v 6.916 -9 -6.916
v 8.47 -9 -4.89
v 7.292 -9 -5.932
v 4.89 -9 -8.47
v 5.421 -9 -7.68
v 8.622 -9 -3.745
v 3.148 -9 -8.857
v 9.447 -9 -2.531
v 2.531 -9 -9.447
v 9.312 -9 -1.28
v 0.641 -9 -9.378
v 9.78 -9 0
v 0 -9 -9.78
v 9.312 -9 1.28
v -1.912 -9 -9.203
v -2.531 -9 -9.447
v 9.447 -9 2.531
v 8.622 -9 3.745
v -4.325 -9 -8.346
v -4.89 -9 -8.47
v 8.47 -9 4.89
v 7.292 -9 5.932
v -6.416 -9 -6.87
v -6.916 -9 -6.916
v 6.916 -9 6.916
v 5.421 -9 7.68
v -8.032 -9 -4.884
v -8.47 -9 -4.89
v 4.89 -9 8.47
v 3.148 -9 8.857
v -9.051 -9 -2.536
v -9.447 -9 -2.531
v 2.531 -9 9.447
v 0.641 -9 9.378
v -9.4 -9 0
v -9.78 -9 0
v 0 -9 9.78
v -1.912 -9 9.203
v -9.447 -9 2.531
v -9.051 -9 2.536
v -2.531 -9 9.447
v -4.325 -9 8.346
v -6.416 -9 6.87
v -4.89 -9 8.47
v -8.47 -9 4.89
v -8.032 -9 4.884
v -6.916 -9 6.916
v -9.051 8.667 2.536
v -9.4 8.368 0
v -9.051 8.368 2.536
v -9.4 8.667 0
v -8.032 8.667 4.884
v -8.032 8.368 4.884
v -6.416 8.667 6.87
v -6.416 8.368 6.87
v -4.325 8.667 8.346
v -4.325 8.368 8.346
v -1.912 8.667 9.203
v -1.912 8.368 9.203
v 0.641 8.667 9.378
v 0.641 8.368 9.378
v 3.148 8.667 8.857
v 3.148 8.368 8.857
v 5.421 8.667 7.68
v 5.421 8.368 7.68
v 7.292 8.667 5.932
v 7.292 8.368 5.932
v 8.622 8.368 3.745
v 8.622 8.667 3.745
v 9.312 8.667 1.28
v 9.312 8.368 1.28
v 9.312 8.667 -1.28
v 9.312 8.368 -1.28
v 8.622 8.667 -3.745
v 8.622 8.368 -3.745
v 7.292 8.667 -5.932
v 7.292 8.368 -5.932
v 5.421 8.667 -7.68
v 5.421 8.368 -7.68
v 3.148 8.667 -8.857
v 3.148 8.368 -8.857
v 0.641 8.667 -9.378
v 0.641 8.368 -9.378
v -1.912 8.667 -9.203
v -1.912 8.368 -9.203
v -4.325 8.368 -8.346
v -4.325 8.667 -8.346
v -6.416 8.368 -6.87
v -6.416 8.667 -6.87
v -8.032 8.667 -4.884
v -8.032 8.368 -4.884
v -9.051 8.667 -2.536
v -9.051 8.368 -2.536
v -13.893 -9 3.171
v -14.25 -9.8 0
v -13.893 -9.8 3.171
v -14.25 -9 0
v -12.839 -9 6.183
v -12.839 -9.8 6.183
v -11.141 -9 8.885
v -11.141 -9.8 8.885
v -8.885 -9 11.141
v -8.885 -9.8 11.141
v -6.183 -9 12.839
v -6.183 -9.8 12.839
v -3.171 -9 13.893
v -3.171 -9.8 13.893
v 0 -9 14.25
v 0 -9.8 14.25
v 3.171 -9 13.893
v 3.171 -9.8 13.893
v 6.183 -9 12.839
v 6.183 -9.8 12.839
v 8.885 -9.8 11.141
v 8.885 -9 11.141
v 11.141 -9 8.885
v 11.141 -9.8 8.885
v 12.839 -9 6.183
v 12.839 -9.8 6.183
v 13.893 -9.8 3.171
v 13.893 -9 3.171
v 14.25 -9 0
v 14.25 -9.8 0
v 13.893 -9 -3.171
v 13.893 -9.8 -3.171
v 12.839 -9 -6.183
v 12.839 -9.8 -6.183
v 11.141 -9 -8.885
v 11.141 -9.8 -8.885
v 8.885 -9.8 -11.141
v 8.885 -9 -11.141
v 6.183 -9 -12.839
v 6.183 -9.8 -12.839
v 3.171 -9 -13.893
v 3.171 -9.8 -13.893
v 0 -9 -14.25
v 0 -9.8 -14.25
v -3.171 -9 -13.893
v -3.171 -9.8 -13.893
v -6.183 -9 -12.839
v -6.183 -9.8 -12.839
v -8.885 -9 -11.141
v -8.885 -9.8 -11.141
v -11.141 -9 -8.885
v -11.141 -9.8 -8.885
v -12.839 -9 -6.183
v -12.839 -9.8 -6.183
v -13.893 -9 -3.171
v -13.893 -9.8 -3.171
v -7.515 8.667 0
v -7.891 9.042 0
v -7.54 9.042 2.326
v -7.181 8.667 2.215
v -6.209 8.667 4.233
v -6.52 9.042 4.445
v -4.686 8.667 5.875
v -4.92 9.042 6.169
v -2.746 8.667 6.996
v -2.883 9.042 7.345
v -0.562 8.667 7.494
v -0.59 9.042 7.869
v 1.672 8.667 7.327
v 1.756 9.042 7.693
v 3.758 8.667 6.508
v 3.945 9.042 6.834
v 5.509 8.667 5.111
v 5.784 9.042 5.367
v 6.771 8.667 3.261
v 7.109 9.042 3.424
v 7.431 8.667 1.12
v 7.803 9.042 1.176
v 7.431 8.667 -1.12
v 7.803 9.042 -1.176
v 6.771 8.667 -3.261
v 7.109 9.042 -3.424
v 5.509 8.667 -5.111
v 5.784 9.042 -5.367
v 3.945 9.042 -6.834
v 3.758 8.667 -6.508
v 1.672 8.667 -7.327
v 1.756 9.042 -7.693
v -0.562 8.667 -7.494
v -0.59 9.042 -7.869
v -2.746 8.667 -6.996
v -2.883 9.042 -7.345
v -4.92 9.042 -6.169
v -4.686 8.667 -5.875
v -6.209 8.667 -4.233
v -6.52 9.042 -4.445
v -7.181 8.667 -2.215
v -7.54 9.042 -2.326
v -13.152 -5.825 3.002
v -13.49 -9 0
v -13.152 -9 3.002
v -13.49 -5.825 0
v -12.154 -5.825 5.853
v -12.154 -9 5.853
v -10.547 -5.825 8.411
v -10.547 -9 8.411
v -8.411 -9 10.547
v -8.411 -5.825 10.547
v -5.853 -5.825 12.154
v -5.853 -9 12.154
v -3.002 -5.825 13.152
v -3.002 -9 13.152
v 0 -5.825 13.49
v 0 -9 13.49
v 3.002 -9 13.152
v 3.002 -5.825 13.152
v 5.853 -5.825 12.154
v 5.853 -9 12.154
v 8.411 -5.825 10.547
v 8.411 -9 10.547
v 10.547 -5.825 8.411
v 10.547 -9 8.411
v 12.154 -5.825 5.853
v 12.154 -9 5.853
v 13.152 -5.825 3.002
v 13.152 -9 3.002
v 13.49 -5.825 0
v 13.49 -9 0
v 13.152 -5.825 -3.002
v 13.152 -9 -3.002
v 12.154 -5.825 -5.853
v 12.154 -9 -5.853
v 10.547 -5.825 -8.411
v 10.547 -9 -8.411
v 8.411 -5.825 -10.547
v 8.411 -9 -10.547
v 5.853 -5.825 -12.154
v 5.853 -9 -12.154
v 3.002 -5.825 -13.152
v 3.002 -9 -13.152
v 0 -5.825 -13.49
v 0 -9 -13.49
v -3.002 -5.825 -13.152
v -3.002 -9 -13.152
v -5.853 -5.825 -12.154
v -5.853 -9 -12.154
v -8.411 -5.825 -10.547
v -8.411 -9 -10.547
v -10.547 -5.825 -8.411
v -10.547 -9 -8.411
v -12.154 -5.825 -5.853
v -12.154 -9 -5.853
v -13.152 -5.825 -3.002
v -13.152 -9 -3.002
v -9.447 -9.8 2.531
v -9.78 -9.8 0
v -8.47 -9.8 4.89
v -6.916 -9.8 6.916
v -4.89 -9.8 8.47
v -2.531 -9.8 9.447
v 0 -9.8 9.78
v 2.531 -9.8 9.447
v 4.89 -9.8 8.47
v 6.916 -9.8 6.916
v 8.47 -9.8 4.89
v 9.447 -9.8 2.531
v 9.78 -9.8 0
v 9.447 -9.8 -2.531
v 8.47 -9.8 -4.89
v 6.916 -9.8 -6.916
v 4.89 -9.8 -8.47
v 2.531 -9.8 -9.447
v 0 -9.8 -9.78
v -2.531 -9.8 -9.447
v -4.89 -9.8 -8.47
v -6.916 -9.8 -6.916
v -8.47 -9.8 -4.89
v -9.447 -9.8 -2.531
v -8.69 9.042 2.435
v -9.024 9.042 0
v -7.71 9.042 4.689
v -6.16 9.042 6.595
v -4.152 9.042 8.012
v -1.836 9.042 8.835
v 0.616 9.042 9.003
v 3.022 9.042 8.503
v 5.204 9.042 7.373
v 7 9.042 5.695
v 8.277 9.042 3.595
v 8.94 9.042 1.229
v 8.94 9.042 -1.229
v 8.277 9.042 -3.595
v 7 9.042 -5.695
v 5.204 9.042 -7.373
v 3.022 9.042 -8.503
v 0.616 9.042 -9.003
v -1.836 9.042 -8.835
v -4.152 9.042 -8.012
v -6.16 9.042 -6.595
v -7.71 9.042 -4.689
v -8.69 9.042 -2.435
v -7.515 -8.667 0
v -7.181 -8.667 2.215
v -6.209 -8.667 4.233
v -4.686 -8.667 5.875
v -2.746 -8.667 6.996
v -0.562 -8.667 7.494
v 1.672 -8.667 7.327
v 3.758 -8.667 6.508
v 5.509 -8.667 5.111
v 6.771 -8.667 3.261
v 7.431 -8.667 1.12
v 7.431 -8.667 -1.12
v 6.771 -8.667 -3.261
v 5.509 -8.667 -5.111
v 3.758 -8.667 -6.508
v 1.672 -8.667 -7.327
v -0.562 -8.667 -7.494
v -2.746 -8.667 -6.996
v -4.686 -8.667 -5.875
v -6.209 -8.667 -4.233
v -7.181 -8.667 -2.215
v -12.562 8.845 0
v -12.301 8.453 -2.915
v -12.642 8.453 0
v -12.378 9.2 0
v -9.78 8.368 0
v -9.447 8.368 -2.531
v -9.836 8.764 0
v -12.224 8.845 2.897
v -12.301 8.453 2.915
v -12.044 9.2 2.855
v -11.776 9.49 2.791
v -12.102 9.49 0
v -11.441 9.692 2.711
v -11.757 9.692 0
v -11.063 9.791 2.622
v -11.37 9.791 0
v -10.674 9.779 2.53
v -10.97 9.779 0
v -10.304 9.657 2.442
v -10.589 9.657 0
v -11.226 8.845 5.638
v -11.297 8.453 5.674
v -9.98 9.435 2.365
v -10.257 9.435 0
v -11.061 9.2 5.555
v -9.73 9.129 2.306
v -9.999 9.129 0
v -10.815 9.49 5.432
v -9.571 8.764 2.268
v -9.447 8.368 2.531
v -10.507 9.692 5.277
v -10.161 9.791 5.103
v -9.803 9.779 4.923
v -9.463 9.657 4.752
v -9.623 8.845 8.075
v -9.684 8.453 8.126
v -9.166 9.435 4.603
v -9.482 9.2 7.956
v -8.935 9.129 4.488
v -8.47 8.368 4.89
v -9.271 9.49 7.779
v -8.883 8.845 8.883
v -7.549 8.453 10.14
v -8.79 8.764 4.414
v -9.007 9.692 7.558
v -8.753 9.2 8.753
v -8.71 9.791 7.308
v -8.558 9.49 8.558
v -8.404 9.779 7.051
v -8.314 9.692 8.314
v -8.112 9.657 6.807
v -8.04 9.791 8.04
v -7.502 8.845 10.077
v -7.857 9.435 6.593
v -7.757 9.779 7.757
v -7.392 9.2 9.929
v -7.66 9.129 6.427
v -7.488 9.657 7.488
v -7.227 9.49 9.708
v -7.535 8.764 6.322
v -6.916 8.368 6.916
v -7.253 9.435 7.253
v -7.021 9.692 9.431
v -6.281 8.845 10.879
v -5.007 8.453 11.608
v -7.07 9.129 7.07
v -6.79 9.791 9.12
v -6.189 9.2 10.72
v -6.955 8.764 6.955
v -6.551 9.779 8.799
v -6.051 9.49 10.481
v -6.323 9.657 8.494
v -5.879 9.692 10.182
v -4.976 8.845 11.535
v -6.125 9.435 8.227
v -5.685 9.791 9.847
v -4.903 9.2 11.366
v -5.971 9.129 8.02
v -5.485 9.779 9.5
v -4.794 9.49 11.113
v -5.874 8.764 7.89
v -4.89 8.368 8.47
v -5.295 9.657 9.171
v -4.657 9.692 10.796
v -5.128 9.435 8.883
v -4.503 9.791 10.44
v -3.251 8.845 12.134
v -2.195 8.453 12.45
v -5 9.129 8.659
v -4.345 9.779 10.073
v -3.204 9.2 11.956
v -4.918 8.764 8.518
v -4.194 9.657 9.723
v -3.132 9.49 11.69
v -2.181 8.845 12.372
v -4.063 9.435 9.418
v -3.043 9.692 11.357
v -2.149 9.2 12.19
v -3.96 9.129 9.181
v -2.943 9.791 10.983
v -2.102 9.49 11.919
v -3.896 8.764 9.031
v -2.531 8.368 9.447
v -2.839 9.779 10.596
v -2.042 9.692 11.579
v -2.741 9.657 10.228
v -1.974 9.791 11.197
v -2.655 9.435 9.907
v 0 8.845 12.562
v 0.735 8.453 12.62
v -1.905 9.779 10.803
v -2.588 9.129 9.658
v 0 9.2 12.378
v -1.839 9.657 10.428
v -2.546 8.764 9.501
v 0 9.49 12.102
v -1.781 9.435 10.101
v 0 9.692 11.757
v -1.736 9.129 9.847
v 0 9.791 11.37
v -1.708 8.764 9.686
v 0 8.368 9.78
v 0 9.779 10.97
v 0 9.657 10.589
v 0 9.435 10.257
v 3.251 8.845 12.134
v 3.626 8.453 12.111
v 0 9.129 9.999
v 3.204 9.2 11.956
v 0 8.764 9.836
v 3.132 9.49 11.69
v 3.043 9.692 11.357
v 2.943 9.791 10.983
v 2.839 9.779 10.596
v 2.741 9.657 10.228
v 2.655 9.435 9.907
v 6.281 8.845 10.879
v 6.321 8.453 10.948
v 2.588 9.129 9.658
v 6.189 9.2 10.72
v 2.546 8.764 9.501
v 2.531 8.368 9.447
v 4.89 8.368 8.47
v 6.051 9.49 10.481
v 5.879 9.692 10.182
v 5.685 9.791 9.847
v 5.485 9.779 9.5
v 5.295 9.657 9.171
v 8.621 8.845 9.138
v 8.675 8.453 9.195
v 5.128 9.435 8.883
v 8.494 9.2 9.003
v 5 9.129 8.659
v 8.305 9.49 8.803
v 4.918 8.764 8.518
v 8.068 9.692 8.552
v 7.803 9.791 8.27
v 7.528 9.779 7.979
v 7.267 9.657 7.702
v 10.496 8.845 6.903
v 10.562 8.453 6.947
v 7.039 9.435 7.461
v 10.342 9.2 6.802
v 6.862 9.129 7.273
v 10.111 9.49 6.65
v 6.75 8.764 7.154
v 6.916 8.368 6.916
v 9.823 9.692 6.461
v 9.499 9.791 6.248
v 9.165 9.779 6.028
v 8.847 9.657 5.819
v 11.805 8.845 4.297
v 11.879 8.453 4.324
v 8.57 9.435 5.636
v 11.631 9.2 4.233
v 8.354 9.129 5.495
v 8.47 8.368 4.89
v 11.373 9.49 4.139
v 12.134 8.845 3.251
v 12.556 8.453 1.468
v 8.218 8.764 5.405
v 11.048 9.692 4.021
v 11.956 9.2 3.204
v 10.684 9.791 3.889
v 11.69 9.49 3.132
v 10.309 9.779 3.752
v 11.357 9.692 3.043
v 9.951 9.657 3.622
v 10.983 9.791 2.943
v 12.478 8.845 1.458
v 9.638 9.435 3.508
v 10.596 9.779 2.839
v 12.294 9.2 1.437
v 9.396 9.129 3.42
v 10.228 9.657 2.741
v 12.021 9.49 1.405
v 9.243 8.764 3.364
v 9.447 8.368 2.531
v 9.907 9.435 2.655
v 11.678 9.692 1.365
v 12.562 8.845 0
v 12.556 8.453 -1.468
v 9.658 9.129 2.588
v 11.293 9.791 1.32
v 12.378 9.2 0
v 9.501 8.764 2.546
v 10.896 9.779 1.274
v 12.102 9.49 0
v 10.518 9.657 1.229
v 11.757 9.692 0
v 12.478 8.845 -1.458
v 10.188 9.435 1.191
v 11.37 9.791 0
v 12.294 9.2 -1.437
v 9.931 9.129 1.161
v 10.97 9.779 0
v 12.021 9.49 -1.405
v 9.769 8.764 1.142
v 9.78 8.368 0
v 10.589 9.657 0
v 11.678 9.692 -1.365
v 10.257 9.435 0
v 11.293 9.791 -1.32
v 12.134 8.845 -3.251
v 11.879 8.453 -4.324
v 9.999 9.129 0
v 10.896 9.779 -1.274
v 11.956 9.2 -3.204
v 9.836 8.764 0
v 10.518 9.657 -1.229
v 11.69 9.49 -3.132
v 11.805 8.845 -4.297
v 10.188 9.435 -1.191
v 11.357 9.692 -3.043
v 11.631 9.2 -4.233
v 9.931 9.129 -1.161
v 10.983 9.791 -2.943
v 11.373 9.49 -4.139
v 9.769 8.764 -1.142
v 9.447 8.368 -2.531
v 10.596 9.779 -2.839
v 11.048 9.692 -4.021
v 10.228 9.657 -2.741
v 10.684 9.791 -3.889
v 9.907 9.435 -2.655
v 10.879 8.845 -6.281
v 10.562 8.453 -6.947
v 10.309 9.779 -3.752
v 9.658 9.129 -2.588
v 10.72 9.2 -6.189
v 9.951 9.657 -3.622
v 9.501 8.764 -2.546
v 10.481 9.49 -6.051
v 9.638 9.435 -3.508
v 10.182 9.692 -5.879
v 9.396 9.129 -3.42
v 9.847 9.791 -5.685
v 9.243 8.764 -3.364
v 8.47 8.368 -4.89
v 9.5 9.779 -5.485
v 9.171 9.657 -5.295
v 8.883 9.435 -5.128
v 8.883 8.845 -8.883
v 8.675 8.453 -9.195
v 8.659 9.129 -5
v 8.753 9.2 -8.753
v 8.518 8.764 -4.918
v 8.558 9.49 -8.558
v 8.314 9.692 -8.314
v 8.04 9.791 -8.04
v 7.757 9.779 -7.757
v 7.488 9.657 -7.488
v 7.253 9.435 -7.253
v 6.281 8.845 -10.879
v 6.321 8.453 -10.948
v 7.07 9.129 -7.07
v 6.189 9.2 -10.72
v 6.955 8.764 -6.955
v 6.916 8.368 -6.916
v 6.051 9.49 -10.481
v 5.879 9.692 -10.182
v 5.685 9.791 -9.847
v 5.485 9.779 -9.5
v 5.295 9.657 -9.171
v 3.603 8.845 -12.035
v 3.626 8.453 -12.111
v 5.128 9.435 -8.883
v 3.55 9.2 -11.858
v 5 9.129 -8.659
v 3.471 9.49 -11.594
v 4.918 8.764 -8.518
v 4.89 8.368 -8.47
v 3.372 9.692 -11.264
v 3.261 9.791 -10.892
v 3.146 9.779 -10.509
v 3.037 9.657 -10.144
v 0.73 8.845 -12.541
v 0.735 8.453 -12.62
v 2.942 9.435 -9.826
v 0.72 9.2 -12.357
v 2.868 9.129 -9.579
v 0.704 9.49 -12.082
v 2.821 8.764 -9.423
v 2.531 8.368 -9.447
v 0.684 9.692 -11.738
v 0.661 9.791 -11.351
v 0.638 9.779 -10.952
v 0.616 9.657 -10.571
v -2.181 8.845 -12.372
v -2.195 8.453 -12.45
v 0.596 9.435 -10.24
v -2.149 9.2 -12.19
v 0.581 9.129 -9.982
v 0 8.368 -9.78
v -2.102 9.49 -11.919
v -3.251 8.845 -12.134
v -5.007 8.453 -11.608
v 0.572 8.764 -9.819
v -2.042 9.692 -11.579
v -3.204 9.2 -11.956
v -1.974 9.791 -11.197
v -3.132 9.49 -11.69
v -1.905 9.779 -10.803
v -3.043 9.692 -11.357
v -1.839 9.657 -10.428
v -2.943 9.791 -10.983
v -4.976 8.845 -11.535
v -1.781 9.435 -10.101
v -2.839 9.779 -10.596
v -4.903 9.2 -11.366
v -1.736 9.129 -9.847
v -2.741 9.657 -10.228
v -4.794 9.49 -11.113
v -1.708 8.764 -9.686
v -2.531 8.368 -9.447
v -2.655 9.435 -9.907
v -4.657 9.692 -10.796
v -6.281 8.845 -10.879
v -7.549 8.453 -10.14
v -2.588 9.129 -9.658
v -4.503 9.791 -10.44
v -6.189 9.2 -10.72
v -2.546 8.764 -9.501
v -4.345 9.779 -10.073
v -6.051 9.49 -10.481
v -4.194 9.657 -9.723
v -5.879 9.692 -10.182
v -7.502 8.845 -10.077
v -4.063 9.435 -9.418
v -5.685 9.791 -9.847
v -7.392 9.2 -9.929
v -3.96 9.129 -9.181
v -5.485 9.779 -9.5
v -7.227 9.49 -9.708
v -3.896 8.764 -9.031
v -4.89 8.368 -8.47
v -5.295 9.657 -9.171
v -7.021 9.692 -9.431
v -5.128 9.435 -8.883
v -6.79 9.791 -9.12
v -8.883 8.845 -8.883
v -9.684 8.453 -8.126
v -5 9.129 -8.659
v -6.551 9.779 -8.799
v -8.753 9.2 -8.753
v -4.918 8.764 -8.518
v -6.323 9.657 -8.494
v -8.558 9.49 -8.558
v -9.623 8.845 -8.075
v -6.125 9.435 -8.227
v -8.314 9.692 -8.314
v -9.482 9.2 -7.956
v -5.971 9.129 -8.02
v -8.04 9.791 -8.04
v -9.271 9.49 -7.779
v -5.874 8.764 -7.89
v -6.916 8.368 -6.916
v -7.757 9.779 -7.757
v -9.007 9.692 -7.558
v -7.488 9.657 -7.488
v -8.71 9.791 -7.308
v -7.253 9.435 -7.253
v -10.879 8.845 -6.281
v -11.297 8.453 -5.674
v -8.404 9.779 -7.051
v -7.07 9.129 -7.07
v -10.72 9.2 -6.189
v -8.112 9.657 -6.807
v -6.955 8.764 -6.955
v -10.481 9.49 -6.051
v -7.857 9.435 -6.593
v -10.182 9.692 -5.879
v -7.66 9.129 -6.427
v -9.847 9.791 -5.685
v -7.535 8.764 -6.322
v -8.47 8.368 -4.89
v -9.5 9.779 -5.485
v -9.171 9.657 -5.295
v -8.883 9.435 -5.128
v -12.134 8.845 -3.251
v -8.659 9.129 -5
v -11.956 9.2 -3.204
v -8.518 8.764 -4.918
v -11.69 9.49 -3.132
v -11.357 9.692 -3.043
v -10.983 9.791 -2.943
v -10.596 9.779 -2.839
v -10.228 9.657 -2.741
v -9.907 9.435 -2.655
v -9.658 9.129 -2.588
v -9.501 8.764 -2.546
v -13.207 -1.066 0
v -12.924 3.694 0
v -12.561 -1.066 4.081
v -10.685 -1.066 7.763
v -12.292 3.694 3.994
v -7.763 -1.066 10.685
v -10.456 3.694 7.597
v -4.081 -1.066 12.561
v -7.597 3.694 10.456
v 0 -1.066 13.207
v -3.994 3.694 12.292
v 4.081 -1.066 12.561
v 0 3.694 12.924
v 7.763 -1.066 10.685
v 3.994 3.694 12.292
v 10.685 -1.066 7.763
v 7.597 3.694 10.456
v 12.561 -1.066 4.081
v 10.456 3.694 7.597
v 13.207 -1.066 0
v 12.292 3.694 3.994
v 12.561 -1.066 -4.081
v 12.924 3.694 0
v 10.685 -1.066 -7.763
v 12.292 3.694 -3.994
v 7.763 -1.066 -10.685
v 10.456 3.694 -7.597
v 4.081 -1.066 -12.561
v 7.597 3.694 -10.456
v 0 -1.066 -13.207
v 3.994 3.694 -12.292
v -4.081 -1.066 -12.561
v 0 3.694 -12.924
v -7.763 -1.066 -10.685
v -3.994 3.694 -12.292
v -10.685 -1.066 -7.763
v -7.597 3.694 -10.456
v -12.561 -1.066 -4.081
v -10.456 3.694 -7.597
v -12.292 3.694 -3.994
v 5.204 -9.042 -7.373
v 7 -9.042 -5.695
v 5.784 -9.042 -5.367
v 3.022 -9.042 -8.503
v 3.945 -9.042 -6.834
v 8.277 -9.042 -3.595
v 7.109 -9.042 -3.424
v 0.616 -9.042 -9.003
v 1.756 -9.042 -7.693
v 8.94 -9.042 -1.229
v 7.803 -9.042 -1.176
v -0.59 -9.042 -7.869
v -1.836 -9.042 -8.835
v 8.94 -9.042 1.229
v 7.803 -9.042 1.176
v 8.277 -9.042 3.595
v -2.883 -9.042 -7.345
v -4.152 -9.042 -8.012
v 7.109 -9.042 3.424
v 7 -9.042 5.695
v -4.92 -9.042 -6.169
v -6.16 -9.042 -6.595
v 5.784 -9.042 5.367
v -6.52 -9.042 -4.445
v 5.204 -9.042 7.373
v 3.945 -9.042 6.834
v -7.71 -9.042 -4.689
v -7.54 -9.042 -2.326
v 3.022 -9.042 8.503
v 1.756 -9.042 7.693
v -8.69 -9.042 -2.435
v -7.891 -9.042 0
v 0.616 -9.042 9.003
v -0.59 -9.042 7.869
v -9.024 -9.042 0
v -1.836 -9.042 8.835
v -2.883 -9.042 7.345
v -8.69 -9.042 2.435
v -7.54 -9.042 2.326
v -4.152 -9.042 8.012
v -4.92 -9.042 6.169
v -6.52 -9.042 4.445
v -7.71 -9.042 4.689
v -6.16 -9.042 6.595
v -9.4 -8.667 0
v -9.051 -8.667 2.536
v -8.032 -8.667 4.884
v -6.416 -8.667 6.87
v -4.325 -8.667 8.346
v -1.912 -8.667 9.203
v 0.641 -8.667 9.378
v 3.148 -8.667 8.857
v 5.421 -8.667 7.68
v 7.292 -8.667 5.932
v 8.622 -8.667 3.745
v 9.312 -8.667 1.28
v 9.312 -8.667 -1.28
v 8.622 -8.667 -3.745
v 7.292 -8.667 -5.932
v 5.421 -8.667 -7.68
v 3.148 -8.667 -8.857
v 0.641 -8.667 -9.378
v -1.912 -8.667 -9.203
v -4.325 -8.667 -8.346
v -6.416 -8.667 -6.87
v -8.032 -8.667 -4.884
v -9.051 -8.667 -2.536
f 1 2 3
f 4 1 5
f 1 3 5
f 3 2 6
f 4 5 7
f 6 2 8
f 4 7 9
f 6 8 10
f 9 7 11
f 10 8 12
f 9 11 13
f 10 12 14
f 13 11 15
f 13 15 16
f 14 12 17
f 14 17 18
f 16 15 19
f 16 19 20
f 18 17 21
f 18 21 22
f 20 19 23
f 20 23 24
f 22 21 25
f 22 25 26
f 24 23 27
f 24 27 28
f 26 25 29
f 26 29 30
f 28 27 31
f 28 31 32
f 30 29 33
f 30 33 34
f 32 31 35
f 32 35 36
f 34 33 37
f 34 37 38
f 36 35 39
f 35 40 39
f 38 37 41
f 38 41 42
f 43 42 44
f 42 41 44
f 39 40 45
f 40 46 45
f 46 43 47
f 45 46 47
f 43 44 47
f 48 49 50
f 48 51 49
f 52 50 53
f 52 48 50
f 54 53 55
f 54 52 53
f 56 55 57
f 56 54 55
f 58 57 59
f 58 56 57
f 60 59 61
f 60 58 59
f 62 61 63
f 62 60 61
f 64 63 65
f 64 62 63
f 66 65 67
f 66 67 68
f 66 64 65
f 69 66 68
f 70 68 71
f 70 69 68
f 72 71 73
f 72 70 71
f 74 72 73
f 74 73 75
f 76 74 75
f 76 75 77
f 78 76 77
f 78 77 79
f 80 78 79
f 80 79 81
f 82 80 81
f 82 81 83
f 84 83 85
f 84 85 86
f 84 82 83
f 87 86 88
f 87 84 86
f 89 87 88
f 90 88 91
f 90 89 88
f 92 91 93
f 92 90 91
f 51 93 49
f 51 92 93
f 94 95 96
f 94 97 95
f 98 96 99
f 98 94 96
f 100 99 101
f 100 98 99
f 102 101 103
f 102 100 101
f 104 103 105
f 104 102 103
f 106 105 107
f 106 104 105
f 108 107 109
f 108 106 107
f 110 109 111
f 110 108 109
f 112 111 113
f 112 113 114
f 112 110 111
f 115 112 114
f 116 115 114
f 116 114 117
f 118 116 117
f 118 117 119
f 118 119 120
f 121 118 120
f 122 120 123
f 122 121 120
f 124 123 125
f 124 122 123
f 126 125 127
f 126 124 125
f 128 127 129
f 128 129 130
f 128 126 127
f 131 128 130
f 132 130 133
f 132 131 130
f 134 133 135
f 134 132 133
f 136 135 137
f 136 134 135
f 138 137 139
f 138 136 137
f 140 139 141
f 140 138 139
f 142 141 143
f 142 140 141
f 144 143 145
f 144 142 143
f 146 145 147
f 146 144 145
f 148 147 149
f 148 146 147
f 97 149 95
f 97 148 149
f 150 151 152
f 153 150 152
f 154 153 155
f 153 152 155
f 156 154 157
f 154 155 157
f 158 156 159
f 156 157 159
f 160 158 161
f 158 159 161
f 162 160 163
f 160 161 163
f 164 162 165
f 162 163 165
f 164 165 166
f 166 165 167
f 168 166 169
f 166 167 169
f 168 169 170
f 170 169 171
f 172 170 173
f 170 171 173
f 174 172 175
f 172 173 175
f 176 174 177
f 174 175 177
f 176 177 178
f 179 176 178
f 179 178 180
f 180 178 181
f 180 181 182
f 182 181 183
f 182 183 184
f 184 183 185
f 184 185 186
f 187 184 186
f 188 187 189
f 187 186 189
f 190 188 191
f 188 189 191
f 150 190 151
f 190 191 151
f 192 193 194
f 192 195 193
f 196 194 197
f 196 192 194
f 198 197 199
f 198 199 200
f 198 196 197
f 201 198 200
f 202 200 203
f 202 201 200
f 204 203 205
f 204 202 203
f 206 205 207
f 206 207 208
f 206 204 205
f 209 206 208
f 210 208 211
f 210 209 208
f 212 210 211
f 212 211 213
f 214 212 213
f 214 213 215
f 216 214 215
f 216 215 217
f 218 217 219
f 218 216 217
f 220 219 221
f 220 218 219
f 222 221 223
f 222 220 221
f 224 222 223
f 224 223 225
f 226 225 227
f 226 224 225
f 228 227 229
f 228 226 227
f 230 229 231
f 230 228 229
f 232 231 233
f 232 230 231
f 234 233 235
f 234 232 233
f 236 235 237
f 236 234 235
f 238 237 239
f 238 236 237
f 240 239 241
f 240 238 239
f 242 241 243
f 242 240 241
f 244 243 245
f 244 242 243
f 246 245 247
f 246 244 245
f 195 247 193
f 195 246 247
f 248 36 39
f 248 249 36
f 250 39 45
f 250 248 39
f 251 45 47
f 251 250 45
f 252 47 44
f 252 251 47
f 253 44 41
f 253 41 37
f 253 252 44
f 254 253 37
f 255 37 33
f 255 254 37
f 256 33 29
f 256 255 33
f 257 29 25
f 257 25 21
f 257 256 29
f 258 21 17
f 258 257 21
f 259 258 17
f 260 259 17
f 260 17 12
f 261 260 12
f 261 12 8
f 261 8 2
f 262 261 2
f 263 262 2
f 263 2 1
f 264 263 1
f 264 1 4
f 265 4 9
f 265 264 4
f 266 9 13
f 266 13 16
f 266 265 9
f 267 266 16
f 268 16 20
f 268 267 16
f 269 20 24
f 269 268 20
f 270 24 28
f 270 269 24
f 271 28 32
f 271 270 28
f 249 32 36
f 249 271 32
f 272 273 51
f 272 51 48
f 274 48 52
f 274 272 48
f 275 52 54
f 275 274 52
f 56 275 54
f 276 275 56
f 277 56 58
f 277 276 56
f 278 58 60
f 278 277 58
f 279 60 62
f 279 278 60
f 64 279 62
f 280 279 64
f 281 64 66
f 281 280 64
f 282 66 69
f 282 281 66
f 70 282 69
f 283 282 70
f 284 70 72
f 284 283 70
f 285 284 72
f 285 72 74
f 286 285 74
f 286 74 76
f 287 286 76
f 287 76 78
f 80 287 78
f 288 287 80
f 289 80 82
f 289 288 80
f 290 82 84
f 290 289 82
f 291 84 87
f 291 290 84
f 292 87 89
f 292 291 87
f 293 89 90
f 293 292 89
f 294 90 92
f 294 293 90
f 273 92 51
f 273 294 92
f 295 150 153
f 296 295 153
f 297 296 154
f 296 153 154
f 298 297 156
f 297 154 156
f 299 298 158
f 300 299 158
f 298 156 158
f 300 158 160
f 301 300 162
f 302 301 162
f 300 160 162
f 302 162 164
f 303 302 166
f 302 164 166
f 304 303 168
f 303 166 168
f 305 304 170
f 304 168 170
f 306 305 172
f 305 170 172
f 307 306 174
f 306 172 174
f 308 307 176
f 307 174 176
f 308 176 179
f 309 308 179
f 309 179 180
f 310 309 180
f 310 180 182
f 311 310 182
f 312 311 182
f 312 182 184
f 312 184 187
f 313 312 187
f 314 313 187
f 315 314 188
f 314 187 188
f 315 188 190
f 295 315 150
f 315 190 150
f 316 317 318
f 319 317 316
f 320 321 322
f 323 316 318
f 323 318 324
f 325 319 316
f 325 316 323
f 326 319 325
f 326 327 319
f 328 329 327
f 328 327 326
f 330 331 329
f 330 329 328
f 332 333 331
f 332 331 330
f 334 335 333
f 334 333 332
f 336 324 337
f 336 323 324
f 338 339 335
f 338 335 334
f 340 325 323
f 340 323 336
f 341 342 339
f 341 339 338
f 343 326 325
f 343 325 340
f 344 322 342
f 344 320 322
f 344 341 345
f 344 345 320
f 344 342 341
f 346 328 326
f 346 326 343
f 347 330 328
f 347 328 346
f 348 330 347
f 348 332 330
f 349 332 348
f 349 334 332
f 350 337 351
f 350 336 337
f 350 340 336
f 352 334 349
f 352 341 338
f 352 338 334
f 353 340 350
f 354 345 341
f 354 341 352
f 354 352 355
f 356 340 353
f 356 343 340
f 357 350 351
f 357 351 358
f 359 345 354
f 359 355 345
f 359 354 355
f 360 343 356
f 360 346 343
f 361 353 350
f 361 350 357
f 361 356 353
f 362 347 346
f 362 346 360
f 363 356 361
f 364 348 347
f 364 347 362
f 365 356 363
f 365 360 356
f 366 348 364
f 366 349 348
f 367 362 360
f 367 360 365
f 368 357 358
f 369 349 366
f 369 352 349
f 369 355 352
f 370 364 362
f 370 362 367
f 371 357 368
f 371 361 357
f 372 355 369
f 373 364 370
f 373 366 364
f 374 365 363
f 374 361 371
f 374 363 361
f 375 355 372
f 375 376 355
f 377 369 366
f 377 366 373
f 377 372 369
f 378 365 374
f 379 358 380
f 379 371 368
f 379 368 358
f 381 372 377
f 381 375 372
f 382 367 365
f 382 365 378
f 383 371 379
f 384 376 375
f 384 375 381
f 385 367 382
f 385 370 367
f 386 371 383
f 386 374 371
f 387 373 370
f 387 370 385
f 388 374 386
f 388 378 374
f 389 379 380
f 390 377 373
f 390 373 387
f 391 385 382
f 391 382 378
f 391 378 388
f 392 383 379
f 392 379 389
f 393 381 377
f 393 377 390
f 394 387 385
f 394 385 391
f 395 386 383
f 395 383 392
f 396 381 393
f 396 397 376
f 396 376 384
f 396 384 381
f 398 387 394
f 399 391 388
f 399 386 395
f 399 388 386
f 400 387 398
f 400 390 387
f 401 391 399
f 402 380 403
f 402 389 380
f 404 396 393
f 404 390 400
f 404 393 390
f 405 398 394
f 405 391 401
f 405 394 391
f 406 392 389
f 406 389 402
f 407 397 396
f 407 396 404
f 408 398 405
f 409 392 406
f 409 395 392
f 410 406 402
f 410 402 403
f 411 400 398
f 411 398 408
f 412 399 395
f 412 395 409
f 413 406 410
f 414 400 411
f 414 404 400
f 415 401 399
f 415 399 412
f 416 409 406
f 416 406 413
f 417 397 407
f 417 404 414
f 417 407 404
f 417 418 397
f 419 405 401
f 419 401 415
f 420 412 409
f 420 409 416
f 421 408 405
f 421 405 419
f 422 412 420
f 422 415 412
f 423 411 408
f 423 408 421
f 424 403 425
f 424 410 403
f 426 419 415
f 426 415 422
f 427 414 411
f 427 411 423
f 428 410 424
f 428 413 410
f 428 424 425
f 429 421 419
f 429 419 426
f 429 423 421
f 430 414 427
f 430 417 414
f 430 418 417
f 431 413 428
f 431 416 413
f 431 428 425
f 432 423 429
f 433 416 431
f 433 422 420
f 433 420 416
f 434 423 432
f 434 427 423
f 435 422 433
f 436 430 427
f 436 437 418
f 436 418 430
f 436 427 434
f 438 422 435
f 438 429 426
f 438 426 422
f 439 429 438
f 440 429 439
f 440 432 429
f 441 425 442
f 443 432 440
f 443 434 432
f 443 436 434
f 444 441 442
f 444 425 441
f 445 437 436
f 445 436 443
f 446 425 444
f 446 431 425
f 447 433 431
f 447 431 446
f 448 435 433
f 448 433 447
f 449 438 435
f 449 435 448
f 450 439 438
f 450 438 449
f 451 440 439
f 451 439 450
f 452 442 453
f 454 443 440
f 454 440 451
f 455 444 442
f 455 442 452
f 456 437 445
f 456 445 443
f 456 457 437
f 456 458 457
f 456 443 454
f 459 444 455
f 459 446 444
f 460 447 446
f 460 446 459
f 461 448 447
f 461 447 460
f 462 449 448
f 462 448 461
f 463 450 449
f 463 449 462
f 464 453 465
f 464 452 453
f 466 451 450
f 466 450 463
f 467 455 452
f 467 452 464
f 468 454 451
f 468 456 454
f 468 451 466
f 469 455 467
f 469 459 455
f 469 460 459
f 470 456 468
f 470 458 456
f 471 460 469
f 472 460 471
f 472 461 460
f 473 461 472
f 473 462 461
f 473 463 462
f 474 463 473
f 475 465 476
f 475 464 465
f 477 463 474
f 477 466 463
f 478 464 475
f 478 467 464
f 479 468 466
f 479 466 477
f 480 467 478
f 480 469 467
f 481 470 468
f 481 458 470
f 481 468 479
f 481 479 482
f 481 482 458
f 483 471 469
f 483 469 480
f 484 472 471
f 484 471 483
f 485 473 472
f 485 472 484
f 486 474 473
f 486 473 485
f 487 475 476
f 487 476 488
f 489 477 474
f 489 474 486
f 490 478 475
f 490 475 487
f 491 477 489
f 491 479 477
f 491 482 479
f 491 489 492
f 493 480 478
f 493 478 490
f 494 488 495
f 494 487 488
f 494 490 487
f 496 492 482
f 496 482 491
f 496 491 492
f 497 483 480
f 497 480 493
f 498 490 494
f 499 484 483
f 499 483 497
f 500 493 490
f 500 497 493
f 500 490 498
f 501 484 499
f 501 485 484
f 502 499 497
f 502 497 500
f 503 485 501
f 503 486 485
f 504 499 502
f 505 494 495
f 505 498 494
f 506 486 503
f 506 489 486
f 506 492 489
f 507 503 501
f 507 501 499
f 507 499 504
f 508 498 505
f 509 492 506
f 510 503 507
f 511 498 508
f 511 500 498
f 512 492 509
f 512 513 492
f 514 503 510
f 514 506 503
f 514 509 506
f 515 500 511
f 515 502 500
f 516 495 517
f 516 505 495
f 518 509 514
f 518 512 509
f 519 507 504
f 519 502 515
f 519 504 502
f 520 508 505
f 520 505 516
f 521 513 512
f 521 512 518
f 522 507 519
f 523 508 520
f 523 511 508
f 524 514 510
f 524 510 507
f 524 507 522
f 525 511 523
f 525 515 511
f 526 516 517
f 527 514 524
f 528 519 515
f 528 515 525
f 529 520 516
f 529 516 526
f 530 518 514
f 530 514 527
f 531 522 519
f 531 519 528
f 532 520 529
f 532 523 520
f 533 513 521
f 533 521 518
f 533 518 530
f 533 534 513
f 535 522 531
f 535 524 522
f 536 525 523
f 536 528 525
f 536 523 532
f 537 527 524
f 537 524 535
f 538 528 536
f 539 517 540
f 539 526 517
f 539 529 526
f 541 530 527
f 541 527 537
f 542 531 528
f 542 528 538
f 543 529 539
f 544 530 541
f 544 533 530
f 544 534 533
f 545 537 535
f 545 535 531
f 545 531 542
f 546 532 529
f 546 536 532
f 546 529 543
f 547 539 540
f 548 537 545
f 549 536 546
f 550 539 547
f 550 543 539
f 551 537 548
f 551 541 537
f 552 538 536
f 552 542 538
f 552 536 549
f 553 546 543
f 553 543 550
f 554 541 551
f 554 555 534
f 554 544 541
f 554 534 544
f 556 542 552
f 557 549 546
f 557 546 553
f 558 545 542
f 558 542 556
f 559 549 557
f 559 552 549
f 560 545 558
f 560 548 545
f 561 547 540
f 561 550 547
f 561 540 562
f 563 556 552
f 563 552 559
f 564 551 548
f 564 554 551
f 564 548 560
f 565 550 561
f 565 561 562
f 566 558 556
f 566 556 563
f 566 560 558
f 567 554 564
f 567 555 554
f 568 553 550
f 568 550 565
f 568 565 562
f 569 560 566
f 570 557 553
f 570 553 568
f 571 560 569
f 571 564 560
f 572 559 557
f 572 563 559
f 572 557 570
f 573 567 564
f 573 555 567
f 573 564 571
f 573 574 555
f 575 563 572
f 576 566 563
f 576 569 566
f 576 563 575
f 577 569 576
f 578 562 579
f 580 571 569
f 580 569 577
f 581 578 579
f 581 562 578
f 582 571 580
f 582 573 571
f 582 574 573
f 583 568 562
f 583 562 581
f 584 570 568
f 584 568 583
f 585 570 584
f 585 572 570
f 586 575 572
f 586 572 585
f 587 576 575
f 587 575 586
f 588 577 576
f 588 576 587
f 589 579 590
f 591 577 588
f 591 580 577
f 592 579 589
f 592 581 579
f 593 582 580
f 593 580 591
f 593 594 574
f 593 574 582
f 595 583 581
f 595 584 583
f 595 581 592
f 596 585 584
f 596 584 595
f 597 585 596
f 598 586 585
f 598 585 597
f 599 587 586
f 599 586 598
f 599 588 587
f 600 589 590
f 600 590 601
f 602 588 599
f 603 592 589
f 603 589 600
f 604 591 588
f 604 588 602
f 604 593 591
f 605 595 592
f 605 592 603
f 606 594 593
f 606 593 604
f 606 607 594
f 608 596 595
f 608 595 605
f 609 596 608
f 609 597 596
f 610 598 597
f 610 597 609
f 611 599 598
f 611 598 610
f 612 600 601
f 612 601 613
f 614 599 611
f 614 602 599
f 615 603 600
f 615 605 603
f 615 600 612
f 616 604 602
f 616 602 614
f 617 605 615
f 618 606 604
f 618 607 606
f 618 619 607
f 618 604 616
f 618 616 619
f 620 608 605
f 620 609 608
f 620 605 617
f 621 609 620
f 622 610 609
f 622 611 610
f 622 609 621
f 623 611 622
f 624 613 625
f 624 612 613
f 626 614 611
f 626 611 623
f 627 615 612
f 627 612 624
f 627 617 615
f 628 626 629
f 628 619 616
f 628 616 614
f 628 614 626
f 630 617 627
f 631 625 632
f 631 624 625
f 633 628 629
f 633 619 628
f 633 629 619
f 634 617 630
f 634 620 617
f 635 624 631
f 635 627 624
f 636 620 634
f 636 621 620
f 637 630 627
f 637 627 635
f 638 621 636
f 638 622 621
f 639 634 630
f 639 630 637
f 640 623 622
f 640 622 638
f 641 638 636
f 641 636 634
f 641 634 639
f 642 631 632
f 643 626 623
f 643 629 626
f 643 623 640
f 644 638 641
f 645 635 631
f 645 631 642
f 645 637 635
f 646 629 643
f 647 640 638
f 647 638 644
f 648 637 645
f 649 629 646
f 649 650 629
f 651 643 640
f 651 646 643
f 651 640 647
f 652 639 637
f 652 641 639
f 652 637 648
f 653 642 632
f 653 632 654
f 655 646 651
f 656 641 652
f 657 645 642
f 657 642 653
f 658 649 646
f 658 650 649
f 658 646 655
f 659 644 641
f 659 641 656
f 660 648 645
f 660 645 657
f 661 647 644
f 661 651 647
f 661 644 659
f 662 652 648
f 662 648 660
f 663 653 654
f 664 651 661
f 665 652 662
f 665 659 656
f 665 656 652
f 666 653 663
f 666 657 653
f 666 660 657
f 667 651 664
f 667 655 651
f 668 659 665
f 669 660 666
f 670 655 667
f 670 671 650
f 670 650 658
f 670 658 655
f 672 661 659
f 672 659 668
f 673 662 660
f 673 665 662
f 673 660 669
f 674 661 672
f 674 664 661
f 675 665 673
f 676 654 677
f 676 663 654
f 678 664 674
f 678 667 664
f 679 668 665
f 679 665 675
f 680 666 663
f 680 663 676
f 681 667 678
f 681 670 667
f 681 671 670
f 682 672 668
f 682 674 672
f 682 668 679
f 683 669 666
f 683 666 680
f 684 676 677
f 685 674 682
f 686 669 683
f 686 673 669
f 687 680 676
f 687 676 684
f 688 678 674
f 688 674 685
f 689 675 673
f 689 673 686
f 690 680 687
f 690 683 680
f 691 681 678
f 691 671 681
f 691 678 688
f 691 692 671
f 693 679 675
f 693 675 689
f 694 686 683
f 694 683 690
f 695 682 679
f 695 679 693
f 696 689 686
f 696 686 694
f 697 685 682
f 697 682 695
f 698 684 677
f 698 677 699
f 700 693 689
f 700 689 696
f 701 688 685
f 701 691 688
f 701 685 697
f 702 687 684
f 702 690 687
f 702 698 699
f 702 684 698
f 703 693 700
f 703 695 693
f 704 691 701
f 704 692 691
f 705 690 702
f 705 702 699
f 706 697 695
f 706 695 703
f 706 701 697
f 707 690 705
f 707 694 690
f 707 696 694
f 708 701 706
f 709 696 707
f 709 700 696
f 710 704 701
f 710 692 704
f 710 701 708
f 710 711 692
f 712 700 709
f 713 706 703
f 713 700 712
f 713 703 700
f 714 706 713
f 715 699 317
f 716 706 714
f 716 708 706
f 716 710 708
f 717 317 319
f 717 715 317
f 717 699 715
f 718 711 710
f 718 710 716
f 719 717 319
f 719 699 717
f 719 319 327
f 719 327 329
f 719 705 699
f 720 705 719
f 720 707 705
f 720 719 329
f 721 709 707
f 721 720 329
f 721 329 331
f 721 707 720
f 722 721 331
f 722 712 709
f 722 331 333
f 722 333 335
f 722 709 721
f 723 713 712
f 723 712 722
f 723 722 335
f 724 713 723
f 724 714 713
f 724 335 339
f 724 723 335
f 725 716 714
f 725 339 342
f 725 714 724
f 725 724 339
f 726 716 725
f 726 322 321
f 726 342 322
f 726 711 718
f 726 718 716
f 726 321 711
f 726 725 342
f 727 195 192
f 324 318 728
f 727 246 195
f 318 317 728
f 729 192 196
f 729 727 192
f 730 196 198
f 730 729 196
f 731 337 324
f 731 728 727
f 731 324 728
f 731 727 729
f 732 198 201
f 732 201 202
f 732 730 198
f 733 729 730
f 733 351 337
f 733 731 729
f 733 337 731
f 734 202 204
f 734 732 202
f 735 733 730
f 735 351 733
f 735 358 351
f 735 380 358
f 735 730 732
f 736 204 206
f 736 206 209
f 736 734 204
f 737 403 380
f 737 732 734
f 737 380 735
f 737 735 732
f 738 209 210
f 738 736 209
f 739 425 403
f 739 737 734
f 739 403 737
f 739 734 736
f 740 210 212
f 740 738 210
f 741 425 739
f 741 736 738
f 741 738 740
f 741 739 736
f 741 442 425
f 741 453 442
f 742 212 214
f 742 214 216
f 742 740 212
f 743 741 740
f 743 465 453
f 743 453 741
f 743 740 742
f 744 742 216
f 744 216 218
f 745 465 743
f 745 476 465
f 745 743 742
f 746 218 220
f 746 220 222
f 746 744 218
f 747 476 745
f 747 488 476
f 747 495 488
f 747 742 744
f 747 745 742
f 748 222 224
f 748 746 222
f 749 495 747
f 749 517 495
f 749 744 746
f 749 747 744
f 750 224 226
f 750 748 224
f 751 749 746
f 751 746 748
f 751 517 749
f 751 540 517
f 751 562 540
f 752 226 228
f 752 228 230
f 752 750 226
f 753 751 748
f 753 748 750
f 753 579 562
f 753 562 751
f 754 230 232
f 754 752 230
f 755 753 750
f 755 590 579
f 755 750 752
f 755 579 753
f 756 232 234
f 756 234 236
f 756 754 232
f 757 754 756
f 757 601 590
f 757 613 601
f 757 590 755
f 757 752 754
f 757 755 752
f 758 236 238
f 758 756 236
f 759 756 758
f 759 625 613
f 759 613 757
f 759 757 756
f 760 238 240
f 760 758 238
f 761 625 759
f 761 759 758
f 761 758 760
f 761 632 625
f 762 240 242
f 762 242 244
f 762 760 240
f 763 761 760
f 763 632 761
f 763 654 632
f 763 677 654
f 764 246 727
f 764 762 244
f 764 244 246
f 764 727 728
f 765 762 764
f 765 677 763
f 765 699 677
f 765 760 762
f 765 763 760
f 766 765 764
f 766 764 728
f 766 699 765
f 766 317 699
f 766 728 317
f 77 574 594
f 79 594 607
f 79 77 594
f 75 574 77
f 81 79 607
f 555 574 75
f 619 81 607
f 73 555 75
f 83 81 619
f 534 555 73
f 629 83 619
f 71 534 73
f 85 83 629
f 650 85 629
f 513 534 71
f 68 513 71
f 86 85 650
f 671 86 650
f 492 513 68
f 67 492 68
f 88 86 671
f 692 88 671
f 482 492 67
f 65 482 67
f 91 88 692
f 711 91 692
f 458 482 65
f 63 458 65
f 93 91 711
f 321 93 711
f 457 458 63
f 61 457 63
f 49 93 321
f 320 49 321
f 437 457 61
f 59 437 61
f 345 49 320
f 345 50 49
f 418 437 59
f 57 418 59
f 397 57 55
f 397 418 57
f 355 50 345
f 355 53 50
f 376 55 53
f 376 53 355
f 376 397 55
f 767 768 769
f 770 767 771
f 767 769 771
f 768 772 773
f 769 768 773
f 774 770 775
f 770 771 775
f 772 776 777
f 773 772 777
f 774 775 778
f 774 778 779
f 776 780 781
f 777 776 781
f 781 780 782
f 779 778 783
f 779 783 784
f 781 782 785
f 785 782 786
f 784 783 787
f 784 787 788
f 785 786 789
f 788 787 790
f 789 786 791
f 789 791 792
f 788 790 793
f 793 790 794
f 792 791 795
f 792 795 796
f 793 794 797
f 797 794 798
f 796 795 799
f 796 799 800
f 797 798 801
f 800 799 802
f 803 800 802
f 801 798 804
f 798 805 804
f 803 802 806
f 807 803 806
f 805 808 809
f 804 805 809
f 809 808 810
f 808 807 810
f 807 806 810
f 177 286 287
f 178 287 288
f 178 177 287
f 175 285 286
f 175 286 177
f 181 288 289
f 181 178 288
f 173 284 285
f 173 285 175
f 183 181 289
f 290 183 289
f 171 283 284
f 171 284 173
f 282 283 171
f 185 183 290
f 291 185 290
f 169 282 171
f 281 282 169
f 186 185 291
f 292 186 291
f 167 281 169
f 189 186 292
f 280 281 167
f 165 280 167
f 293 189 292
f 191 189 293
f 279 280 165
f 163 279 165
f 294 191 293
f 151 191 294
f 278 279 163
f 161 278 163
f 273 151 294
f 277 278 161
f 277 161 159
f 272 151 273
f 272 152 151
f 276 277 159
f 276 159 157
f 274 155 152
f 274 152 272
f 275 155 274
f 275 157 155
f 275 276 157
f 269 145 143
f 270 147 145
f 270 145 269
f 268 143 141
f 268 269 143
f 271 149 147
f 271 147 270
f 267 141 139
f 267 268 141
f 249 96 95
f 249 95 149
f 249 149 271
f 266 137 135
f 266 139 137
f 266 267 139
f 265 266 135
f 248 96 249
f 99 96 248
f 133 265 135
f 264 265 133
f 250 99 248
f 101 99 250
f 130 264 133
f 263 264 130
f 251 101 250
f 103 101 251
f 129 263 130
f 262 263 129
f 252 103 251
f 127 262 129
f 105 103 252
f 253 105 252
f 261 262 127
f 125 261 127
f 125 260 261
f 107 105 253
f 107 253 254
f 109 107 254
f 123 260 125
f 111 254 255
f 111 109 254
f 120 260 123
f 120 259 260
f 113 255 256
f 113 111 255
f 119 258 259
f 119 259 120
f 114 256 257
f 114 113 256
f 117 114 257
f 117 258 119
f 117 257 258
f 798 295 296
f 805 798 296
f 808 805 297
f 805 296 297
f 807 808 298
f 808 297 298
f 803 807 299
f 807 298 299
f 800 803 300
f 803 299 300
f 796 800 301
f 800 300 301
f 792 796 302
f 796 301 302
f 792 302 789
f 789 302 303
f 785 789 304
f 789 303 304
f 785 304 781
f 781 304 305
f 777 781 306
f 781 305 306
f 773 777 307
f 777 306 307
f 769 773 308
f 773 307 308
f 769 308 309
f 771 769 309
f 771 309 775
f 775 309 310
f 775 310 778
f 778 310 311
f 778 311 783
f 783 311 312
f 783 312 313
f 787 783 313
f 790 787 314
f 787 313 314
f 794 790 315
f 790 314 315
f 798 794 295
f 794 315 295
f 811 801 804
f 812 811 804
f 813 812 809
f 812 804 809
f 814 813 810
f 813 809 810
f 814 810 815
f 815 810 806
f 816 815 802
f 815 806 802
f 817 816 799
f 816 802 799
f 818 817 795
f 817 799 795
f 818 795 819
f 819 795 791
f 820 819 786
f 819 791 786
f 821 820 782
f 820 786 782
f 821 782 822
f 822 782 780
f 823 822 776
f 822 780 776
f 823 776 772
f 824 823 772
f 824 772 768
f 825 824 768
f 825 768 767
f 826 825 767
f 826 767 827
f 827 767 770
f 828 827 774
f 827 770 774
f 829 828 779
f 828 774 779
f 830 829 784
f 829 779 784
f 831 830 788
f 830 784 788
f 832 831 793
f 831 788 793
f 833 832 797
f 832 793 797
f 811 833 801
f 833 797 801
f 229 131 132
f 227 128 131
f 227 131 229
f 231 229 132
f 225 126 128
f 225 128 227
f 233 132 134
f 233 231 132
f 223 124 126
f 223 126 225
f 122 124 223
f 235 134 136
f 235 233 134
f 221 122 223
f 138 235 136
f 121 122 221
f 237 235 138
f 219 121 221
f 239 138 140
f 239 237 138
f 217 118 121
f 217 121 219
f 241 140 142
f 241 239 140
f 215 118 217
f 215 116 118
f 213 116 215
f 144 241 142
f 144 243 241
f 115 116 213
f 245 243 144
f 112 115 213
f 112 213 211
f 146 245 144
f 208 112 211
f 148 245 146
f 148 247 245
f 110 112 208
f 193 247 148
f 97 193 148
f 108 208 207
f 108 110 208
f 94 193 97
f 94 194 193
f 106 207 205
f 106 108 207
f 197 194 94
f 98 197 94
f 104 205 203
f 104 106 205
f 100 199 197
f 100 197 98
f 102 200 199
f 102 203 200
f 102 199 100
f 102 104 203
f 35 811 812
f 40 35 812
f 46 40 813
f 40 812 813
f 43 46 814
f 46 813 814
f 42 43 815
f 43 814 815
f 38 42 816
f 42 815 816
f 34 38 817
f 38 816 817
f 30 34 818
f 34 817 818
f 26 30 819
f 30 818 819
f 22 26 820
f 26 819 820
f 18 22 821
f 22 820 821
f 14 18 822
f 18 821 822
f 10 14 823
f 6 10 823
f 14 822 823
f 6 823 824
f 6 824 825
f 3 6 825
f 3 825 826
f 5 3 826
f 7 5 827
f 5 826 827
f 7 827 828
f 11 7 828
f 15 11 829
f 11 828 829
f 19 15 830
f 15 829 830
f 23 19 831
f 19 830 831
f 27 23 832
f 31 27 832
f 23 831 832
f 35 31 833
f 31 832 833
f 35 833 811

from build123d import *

# Parameters (mm, degrees)
SKETCH3_W     = 1.885
SKETCH3_H     = 18.0848
CHAMFER1_SIZE = 0.37575
SKETCH4_W     = 0.38
SKETCH4_H     = 17.367868501


with BuildPart() as part:
    # Sketch2 → Outer (revolve)
    with BuildSketch(Plane.XY):
        with BuildLine():
            Line((-14.25, -9.8), (-14.25, -9))
            Line((-14.25, -9), (-13.49, -9))
            Line((-13.49, -9), (-13.49, -5.825))
            Line((-13.49, -5.825), (-12.6417422, 8.452803027))
            ThreePointArc((-12.6417422, 8.452803027), (-11.169645536, 9.799369662), (-9.78, 8.367868501))
            Line((-9.78, 8.367868501), (-9.78, -9.8))
            Line((-9.78, -9.8), (-14.25, -9.8))
        make_face()
    revolve(axis=Axis((0, -9.0424, 0), (0, 1, 0)))



with BuildPart() as body_2:
    # Sketch3 → Inner (revolve)
    with BuildSketch(Plane.XY):
        with Locations((-8.4575, 0)):
            Rectangle(SKETCH3_W, SKETCH3_H)
    revolve(axis=Axis((0, -9.0424, 0), (0, 1, 0)))

    # Chamfer1
    chamfer1_edges = [body_2.edges().sort_by_distance(p)[0] for p in [
        (7.515, 9.0424, 0),
        (7.515, -9.0424, 0),
        (9.4, -9.0424, 0),
        (9.4, 9.0424, 0),
    ]]
    chamfer(chamfer1_edges, length=CHAMFER1_SIZE)


with BuildPart() as part_1:
    add(part.part)

    add(body_2.part)  # Combine merges body 2
    # Sketch4 → Combine (revolve)
    with BuildSketch(Plane.XY):
        with Locations((-9.59, -0.316065749)):
            Rectangle(SKETCH4_W, SKETCH4_H)
    revolve(axis=Axis((0, -9.0424, 0), (0, 1, 0)))


solid = part_1.part
